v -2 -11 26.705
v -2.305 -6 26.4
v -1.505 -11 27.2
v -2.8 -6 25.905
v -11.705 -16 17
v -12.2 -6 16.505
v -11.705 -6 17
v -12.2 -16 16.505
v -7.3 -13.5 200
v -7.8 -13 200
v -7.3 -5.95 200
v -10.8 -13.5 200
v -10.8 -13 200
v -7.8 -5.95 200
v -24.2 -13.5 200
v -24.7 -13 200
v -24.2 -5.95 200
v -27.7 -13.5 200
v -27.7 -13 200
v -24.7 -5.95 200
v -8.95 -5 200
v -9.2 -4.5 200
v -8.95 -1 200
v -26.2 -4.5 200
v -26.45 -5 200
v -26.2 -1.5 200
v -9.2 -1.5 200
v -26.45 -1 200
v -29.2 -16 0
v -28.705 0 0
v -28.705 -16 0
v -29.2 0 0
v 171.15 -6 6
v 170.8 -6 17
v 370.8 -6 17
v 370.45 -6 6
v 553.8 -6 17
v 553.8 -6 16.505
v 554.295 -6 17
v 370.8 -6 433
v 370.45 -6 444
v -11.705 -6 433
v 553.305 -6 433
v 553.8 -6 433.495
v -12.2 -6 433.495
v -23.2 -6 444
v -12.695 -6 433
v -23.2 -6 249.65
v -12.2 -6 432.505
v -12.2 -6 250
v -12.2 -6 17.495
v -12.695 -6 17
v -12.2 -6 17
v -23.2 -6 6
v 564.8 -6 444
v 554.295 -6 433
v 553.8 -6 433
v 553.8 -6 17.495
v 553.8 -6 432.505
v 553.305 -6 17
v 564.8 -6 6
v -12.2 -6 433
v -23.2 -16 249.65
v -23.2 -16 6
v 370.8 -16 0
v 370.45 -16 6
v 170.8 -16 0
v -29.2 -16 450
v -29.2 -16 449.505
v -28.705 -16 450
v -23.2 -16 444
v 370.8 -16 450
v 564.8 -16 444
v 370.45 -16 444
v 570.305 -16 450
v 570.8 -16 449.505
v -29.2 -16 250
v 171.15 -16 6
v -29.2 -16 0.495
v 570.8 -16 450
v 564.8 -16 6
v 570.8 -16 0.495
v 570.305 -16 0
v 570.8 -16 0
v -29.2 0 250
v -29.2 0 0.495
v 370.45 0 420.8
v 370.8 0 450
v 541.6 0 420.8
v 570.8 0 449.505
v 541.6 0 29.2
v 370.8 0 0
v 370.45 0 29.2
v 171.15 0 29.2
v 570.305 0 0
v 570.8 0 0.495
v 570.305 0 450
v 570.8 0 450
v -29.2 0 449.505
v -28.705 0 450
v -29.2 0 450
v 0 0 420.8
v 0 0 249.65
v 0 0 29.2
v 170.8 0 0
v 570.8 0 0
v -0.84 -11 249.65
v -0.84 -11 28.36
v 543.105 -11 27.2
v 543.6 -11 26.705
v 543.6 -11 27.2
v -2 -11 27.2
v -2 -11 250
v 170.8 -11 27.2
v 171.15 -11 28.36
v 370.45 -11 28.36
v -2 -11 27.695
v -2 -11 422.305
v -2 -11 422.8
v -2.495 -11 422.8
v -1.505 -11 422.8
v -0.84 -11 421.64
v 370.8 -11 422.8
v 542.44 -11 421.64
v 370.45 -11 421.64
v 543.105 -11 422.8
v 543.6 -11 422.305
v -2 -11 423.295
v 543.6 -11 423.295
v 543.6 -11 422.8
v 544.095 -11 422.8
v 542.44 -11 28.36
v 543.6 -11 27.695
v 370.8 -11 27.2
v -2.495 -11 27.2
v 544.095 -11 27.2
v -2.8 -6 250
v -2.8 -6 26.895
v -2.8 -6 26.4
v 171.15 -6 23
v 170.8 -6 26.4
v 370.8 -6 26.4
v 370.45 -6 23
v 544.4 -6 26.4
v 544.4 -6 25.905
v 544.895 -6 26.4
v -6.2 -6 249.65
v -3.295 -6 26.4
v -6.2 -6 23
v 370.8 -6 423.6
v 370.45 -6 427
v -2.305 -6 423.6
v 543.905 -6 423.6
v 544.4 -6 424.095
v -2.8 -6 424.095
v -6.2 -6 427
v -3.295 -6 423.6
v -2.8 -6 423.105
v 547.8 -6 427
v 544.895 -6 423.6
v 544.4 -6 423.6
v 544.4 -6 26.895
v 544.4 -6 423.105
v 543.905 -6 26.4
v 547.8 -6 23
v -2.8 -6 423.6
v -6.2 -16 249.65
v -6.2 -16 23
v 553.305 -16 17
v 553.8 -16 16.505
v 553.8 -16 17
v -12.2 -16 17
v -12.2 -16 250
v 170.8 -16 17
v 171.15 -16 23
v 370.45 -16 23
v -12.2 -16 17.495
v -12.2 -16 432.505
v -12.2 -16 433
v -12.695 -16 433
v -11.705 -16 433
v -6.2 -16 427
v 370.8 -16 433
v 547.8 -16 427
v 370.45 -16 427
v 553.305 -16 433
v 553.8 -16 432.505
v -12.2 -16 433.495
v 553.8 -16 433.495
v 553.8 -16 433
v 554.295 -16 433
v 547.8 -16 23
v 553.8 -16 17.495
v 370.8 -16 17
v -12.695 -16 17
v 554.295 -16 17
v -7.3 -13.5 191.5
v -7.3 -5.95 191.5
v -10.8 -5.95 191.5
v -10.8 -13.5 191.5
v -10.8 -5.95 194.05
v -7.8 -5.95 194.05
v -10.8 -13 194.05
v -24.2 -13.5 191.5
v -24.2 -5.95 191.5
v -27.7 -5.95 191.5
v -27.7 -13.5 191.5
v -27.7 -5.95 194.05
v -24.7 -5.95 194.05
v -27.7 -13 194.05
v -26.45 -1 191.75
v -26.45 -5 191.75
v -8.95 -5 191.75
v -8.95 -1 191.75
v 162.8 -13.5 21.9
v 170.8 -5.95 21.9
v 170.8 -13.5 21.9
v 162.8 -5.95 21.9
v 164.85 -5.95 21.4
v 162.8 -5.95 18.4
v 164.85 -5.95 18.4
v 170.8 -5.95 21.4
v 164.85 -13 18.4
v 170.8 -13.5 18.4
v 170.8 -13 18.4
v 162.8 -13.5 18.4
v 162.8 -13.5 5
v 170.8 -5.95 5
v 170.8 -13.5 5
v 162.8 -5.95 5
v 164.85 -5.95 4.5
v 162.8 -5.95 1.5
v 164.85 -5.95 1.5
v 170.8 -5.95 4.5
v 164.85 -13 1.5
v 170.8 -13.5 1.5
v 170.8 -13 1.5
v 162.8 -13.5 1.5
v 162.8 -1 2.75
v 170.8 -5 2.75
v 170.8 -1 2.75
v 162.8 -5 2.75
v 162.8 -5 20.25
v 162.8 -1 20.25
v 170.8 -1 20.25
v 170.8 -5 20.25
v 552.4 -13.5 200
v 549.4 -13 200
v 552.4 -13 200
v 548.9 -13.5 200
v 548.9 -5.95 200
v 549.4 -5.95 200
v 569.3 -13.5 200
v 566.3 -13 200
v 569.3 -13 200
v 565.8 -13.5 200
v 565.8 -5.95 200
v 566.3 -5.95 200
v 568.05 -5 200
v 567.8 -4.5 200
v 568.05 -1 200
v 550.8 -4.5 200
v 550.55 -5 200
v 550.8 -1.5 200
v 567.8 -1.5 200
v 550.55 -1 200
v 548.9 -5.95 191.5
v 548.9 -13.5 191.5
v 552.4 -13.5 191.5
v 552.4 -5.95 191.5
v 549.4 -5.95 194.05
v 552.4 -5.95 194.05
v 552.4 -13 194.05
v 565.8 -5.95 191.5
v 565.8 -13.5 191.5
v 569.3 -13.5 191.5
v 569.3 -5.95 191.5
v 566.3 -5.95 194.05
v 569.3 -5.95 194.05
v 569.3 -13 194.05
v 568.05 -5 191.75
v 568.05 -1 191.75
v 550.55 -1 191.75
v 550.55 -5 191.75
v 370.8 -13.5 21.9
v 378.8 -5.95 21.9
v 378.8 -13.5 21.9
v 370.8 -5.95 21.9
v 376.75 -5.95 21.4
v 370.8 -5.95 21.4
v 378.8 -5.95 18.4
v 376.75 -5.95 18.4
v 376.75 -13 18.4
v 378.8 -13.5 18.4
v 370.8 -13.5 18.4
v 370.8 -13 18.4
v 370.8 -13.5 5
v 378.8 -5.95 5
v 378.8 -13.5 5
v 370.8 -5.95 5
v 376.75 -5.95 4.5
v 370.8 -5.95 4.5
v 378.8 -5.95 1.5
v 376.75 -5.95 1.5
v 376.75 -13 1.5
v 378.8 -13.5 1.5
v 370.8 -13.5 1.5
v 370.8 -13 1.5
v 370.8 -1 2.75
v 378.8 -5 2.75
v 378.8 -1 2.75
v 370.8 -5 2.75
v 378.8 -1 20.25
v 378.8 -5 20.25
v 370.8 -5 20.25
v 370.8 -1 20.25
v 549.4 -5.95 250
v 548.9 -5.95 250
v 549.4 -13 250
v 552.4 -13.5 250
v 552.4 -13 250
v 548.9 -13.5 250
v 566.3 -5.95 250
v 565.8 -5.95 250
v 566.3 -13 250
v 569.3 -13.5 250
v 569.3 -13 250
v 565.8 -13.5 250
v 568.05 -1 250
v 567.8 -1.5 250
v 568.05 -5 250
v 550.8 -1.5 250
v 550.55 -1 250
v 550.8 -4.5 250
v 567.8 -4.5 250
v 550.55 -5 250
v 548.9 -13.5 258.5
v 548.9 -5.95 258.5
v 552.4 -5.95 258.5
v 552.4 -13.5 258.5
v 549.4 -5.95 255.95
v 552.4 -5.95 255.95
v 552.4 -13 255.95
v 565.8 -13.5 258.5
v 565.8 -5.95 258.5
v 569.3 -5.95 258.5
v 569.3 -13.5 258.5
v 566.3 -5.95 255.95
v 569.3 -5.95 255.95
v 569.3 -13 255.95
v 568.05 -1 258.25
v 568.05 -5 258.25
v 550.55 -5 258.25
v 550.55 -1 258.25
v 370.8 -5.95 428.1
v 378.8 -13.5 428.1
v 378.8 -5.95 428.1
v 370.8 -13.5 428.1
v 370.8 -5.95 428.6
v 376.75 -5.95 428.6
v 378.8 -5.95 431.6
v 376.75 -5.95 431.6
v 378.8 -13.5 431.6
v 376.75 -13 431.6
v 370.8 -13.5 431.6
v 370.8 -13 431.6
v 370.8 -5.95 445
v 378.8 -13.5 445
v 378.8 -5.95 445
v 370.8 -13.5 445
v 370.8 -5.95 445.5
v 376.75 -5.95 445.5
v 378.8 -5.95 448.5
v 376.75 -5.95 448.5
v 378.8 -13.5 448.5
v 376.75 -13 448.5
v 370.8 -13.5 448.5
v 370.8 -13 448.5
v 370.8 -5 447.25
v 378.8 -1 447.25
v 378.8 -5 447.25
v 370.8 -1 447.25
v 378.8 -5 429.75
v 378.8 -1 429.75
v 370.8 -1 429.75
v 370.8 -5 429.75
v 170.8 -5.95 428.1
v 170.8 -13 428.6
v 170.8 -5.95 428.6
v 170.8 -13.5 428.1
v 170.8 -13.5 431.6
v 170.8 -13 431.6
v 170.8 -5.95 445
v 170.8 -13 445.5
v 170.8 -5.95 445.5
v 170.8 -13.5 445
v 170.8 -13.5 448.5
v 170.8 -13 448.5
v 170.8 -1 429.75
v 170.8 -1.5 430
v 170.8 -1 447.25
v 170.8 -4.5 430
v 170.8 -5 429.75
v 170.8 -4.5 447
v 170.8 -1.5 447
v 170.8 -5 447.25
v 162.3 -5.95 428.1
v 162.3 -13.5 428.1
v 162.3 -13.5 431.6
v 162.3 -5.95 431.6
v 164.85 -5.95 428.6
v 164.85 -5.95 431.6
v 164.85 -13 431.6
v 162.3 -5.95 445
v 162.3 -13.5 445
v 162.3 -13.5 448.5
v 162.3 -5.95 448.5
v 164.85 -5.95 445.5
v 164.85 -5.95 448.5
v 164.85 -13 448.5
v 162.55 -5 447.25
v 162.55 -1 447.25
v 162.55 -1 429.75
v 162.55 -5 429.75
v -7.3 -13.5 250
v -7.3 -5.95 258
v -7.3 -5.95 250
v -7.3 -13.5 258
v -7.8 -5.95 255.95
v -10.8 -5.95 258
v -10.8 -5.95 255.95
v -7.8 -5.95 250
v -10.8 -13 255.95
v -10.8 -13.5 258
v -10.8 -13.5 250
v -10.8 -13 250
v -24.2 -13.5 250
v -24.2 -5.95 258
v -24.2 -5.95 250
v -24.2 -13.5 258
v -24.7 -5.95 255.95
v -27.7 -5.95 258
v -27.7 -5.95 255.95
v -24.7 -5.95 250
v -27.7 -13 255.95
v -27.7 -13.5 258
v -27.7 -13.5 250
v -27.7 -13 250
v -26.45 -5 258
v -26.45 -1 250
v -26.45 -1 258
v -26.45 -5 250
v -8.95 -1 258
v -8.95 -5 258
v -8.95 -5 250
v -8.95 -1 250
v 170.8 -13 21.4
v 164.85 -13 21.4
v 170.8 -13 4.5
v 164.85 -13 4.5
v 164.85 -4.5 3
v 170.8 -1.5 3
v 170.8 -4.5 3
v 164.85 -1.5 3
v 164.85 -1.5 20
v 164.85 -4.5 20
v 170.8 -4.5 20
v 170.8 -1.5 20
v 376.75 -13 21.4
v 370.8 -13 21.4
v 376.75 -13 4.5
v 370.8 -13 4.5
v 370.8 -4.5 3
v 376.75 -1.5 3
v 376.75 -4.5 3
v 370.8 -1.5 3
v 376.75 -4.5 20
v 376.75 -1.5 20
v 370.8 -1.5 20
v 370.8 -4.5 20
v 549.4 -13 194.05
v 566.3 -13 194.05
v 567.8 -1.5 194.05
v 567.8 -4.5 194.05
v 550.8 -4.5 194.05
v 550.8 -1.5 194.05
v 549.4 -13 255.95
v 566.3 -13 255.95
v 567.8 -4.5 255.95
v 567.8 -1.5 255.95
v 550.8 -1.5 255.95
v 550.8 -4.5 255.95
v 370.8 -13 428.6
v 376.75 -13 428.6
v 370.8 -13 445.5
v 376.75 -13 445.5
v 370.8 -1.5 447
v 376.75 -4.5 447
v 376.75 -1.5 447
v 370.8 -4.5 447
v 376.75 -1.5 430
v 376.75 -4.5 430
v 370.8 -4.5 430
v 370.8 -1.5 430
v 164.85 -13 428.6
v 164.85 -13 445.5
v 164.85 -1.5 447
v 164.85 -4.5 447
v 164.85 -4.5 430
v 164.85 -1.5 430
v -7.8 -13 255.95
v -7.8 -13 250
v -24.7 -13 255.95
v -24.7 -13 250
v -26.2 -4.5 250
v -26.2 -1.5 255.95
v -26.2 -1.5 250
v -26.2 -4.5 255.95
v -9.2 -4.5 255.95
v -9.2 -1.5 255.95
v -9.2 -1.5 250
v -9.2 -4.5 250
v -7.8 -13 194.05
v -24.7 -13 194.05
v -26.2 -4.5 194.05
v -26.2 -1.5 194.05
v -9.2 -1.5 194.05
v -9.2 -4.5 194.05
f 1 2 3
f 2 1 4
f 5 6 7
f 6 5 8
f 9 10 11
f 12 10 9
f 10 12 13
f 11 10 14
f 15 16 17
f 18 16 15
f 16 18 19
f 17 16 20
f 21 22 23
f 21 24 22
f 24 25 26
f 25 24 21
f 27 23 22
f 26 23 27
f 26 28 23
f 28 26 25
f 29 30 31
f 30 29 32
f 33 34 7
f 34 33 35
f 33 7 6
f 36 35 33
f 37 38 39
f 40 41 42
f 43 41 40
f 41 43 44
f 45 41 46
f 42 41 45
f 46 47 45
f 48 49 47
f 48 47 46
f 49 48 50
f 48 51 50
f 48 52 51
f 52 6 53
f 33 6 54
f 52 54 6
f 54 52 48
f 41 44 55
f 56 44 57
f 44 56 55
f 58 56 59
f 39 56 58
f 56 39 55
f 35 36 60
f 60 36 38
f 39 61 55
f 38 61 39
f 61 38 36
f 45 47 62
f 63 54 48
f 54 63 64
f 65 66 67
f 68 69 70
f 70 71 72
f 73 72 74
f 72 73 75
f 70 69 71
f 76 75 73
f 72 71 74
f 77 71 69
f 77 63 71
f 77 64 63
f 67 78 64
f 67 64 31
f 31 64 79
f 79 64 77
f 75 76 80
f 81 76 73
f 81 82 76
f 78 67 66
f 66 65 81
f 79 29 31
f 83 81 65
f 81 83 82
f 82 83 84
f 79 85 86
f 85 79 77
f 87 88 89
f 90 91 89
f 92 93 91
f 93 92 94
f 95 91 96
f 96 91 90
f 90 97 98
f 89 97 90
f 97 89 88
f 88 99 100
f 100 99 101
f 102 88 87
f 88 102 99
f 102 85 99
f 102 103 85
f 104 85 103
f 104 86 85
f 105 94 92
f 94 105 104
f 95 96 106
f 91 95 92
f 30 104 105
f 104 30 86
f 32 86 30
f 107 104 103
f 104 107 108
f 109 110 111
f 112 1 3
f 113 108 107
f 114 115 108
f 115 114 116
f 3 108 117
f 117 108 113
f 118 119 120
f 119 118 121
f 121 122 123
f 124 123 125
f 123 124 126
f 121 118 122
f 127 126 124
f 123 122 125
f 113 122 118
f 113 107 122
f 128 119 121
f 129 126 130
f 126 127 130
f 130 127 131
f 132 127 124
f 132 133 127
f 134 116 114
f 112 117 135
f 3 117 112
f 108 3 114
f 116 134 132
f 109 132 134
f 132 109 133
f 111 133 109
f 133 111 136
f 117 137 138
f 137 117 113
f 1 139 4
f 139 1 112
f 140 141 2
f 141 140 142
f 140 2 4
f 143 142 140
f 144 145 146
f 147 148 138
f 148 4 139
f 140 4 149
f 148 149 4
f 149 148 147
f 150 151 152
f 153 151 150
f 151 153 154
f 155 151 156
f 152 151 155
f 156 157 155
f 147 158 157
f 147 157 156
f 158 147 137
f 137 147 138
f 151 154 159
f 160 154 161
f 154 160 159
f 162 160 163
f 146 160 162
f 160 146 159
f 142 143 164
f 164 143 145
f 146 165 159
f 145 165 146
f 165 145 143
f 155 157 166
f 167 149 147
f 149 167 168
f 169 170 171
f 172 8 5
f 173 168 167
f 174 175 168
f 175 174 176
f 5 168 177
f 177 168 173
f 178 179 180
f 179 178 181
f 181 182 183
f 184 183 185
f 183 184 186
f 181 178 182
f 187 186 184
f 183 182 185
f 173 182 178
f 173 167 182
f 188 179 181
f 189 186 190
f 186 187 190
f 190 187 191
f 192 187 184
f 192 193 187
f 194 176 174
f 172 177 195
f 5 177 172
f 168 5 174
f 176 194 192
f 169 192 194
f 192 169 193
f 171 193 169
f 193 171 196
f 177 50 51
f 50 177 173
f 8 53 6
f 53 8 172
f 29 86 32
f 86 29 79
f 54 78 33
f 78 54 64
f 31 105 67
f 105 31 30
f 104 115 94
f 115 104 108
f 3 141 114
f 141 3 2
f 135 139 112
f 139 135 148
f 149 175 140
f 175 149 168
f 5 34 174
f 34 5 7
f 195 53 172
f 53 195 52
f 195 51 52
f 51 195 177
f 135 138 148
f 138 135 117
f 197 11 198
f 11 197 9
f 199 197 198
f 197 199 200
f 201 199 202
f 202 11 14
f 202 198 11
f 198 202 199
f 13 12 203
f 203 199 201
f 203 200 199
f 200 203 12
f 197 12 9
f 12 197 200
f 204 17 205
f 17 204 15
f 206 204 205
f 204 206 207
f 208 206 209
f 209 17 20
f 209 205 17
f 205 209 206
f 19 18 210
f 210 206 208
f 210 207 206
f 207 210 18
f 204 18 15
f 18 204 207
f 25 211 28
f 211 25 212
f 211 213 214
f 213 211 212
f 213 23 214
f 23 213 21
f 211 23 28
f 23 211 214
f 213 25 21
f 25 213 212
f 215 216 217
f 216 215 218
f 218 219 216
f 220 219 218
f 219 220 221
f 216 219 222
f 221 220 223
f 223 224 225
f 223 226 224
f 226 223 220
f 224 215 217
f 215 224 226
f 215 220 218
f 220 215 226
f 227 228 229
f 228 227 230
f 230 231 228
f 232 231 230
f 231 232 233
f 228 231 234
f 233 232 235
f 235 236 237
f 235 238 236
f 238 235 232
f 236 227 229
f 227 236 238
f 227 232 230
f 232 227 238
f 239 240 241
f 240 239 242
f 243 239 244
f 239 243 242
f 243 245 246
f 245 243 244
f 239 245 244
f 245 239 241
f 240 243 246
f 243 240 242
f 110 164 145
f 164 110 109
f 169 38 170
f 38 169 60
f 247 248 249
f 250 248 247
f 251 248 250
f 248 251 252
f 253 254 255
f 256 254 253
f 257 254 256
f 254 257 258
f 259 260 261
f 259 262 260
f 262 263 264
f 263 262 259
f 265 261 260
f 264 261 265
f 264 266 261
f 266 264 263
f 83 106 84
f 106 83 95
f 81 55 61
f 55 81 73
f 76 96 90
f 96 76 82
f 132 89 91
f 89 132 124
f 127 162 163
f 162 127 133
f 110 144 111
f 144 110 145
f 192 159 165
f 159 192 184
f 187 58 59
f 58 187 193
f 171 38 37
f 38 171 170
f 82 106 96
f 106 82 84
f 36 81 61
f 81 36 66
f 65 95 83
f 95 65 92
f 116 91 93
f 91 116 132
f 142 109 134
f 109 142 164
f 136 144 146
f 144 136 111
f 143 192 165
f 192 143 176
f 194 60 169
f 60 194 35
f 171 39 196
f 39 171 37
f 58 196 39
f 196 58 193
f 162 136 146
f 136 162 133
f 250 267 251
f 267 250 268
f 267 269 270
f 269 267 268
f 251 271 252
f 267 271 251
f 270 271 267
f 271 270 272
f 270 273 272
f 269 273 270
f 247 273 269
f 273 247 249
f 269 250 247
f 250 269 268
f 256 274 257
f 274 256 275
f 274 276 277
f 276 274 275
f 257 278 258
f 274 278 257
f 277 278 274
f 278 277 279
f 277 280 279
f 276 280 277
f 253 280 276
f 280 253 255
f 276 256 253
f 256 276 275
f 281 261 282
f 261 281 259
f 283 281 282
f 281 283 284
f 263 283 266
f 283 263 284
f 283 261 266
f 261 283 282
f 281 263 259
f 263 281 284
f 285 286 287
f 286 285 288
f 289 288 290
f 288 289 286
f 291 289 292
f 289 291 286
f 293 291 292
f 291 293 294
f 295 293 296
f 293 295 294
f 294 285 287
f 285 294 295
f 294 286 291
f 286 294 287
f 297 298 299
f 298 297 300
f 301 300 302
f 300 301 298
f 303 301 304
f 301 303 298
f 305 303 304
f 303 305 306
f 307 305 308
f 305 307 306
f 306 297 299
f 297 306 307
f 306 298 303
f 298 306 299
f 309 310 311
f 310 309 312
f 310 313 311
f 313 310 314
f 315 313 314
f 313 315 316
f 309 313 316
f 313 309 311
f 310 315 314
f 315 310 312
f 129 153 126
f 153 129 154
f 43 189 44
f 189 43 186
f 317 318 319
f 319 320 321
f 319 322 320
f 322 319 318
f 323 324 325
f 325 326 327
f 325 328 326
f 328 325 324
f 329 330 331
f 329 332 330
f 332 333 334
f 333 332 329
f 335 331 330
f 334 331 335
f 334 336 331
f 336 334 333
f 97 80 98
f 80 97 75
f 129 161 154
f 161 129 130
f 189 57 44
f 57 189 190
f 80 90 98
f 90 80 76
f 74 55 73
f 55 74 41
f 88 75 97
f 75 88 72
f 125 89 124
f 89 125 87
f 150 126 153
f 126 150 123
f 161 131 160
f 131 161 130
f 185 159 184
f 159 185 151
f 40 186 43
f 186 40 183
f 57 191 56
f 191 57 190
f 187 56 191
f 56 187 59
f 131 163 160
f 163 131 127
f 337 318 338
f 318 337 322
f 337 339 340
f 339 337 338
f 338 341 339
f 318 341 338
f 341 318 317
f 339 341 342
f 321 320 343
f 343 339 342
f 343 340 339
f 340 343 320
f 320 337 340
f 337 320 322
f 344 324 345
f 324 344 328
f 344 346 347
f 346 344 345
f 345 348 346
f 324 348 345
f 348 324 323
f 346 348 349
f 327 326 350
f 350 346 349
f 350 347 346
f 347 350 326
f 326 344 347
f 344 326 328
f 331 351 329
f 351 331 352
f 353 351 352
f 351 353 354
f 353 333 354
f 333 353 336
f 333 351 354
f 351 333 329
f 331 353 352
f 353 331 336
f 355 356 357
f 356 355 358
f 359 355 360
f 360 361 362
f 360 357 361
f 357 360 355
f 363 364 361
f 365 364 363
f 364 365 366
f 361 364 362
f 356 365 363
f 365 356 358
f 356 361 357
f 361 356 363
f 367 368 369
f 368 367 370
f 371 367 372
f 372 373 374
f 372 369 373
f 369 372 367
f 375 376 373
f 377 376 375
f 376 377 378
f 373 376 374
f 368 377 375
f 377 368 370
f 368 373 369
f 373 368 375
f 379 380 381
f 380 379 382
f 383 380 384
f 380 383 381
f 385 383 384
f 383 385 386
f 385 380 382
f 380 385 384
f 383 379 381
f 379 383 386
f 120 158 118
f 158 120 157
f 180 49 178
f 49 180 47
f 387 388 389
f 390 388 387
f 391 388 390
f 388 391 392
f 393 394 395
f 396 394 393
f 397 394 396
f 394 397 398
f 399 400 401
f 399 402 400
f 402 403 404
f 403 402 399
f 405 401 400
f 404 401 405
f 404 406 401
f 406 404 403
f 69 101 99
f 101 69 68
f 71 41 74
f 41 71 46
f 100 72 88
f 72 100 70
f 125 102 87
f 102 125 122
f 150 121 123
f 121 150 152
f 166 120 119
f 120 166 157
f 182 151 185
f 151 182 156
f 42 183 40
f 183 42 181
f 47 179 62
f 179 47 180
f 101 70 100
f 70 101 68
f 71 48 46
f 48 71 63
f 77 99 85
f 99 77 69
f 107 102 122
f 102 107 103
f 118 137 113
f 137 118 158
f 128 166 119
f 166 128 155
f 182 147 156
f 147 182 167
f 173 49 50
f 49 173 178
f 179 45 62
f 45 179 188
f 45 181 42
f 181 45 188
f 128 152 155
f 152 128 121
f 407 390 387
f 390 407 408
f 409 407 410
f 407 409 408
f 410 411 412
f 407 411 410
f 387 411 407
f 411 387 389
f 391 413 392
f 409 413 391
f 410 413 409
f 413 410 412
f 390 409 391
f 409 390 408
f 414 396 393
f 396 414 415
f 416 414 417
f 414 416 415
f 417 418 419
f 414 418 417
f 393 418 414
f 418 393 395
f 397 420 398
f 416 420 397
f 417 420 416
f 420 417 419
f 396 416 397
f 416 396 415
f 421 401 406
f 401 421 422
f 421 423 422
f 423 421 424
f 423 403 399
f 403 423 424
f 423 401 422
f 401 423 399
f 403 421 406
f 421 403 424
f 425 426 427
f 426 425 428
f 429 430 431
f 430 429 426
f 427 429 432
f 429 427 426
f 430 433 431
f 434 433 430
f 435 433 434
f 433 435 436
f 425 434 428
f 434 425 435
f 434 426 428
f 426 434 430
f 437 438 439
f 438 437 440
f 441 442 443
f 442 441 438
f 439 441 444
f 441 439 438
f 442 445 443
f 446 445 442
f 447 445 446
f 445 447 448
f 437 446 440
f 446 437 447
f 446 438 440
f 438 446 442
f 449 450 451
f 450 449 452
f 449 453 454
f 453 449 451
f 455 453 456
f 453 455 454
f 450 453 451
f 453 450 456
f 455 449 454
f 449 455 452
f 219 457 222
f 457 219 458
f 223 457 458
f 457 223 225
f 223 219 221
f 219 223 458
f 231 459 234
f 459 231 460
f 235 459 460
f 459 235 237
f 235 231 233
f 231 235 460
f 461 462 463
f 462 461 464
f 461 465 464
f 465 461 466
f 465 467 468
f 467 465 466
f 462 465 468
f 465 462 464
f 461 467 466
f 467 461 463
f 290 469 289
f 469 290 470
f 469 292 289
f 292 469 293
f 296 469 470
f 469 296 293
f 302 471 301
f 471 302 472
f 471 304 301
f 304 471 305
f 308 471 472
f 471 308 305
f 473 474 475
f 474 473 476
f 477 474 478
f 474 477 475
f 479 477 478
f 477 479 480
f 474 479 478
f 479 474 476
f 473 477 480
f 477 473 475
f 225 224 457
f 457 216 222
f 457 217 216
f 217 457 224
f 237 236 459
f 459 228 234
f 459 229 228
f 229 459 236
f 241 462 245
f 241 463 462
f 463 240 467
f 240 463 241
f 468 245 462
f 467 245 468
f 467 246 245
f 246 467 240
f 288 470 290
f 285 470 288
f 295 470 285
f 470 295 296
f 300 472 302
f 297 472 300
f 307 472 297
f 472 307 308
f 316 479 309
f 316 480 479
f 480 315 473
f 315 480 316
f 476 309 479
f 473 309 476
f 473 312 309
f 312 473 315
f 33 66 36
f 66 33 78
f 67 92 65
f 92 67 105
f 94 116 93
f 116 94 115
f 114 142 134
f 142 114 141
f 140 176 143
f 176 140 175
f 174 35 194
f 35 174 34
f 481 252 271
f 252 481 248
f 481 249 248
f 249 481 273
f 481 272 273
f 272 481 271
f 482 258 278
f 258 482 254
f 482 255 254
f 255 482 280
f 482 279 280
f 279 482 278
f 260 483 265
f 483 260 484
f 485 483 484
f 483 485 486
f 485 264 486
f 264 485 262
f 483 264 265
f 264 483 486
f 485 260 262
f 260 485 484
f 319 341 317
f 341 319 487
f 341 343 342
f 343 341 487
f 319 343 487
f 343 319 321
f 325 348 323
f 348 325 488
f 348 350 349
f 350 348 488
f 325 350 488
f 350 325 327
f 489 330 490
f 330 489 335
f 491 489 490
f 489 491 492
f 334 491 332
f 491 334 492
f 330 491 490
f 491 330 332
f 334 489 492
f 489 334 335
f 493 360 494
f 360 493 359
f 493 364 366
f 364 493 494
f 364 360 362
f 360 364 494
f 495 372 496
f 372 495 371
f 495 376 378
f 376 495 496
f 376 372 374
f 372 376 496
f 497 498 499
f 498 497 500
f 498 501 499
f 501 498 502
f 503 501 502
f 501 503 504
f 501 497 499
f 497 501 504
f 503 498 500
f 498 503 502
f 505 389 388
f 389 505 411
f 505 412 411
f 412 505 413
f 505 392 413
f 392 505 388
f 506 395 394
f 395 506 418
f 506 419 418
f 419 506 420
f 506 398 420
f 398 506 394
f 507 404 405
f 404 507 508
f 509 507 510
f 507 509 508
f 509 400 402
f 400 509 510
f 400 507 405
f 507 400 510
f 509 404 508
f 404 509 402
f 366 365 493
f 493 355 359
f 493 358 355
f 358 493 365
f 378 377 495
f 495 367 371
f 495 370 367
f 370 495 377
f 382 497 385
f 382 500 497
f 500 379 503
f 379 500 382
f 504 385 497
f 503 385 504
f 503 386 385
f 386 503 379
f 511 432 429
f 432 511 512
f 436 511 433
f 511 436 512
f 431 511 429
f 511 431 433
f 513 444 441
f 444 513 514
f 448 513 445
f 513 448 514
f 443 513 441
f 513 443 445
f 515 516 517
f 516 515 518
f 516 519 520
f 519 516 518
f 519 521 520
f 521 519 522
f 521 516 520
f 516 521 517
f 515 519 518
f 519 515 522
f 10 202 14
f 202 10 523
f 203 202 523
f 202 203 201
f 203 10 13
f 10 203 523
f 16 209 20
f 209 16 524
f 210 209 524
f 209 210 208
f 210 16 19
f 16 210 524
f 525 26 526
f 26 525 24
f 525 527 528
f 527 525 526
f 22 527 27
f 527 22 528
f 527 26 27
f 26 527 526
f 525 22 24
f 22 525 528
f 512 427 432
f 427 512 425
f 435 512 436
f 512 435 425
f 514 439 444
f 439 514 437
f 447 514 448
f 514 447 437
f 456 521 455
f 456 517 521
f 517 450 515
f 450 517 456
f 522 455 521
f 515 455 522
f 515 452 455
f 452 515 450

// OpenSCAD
// Rectangular aquarium lid — rim frame from max glass-channel span + modular pieces.
// Uses rim_piece_assembly / rim_corner_assembly (max 200 mm per straight).
// glass_width / glass_depth are the pane (channel) span; placement offsets by
// profile width. Ingress feature values are clear openings; bay adds ~60 mm.
// Corner arms default from glass size (≤400 mm side → side/2, else 200 mm);
// straight runs maximize 200 mm pieces with one remainder segment.
//
// QUICK START
//   include <rim_rectangular_lid.scad>
//   rim_rectangular_lid();                    // assembled preview
//   rim_rectangular_lid(layout = "blowout");  // spread for inspection
//   rim_rectangular_lid(layout = "plate");    // 250×250 mm print bed pack
//
// FEATURE VECTORS (per corner or per side segment)
//   [0] cord_hole          bool
//   [1] cord_hole_inner_d  mm
//   [2] cord_hole_pos      "left"|"middle"|"right"
//   [3] cord_under         bool
//   [4] cord_under_gap_len mm
//   [5] lid_ingress        bool  (opening length > 0)
//   [6] ingress opening    mm (0 = off); bay length = opening + pad (~60 / 2×profile)
//   [7] ingress_depth      mm
//   [8] ingress_on         "a"|"b"  (corners only)
//   [9] cord_hole_on       "a"|"b"  (corners only)
//   [10] cord_under_on     "a"|"b"  (corners only)
//
//   RIM_FEAT_NONE = default row; override corner_features[0..3] (SW,SE,NE,NW)
//   and side_features[side][seg] for middle straight pieces on each side.

include <rim_piece_assembly.scad>

// Feature vector: see header comment block below.
RIM_FEAT_NONE = [
    false, 6, "middle",
    false, 20,
    false, 0, edge_ingress_depth, "a", "a", "a"
];

/* [Glass / frame] */
// Max glass-channel span (the pane). Placement offsets by profile width.
glass_width       = 600;   // max channel width along +X (mm)
glass_depth       = 450;   // max channel depth along +Z (mm)
// glass_thickness is defined in rim_piece_assembly.scad (Customizer there or -D)

/* [Build limits] */
rim_max_piece_len = 200;   // max straight length (mm)
rim_corner_leg    = 0;     // 0 = auto from glass size (see rim_rect_effective_corner_leg)
rim_corner_split  = 400;   // side ≤ this → corner = side/2; else corner = rim_max_piece_len
// 0 = auto 2×profile (~60 mm). Added to user ingress opening → visible U bay.
rim_ingress_opening_offset = 0;

/* [Layout] */
rim_layout        = "assembled"; // "assembled" | "blowout" | "plate"
rim_plate_x       = 250;    // printable bed X (mm)
rim_plate_y       = 250;    // printable bed Y (mm)
rim_layout_gap    = 12;     // spacing between parts (mm)
rim_blowout_gap   = 0;      // 0 = auto (layout_gap×2 + profile width)
rim_plate_margin  = 8;      // bed edge margin (mm)

/* [Corner features — SW, SE, NE, NW] */
corner_features = [
    RIM_FEAT_NONE,
    RIM_FEAT_NONE,
    RIM_FEAT_NONE,
    RIM_FEAT_NONE
];

/* [Side middle-segment features — [S, E, N, W] each a list per segment] */
side_features_s = [];
side_features_e = [];
side_features_n = [];
side_features_w = [];

// ---------------------------------------------------------------------------
// Feature helpers
// ---------------------------------------------------------------------------

// User ingress opening → visible U bay (opening + ~60 mm = 2×profile).
function rim_ingress_opening_pad() =
    rim_ingress_opening_offset > 0 ? rim_ingress_opening_offset : 2 * edge_profile_max_x;

function rim_ingress_bay_from_opening(opening) =
    opening > 0 ? opening + rim_ingress_opening_pad() : 0;

function rim_feat_cord(f)        = f[0];
function rim_feat_cord_d(f)      = f[1];
function rim_feat_cord_pos(f)    = f[2];
function rim_feat_under(f)       = f[3];
function rim_feat_under_gap(f)   = f[4];
function rim_feat_ingress(f)     = f[5] && f[6] > 0;
function rim_feat_ingress_opening(f) = f[6];
function rim_feat_ingress_len(f) = rim_ingress_bay_from_opening(f[6]);
function rim_feat_ingress_dep(f) = f[7];
function rim_feat_ingress_on(f)  = f[8];
function rim_feat_cord_on(f)     = f[9];
function rim_feat_under_on(f)    = f[10];

function rim_side_feat_list(side_idx, lists) =
    side_idx == 0 ? lists[0] :
    side_idx == 1 ? lists[1] :
    side_idx == 2 ? lists[2] : lists[3];

function rim_side_feat(side_idx, seg_idx, lists) =
    let (
        row = rim_side_feat_list(side_idx, lists),
        n   = len(row)
    )
    (seg_idx < n) ? row[seg_idx] : RIM_FEAT_NONE;

function rim_corner_feat(corner_idx, corners = corner_features) =
    corners[corner_idx];

// ---------------------------------------------------------------------------
// Length / join planning
// ---------------------------------------------------------------------------

// Corner arm length from one glass side: ≤split → side/2, else max print length.
function rim_corner_leg_for_dim(dim, max_len = rim_max_piece_len, split = rim_corner_split) =
    dim <= split ? dim / 2 : max_len;

// Uniform corner arms (length_a = length_b): limited by both glass width and depth.
function rim_rect_auto_corner_leg(gw, gd, max_len = rim_max_piece_len, split = rim_corner_split) =
    let (
        leg_w = rim_corner_leg_for_dim(gw, max_len, split),
        leg_d = rim_corner_leg_for_dim(gd, max_len, split)
    )
    max(edge_profile_max_x + 1, min(leg_w, leg_d));

function rim_corner_feat_min_leg(f, base_leg) =
    rim_feat_ingress(f)
        ? max(base_leg, rim_feat_ingress_len(f) + 4)
        : base_leg;

function rim_rect_effective_corner_leg(
    gw = glass_width, gd = glass_depth,
    corners = corner_features, corner_leg = rim_corner_leg,
    max_len = rim_max_piece_len, split = rim_corner_split
) =
    let (
        auto_leg = rim_rect_auto_corner_leg(gw, gd, max_len, split),
        base = corner_leg > edge_profile_max_x ? corner_leg : auto_leg,
        mins = [ for (c = corners) rim_corner_feat_min_leg(c, base) ],
        feat_need = len(mins) > 0 ? max(mins) : base
    )
    max(base, feat_need);

// Straight run between corner legs along one glass side.
function rim_side_straight_total(glass_dim, leg) =
    max(0, glass_dim - 2 * leg);

// Maximize full-length pieces; one remainder segment if needed.
function rim_rect_straight_segments(run_len, max_len = rim_max_piece_len) =
    run_len <= 0 ? [] :
    let (
        n_full = floor(run_len / max_len),
        partial = run_len - n_full * max_len
    )
    n_full == 0 ? [run_len] :
    partial > 0
        ? concat([ for (i = [0 : n_full - 1]) max_len ], [partial])
        : [ for (i = [0 : n_full - 1]) max_len ];

// edge_join_ends for a straight chained between female corner pockets.
function rim_rect_straight_joins(seg_idx, seg_count) =
    seg_count == 1 ? 2 :          // both male → two corners
    seg_idx == 0 ? 1 :            // male into corner, female to next
    seg_idx == seg_count - 1 ? 2 : // male from prev, male into corner
    1;                            // middle link

function rim_rect_side_dims(gw = glass_width, gd = glass_depth, corners = corner_features) =
    let (leg = rim_rect_effective_corner_leg(gw, gd, corners))
    [
        rim_side_straight_total(gw, leg),
        rim_side_straight_total(gd, leg),
        rim_side_straight_total(gw, leg),
        rim_side_straight_total(gd, leg)
    ];

function rim_rect_side_seg_lens(side_idx, gw = glass_width, gd = glass_depth,
    max_len = rim_max_piece_len, corners = corner_features
) =
    let (
        leg  = rim_rect_effective_corner_leg(gw, gd, corners),
        dim  = (side_idx == 0 || side_idx == 2) ? gw : gd,
        run  = rim_side_straight_total(dim, leg)
    )
    rim_rect_straight_segments(run, max_len);

// ---------------------------------------------------------------------------
// Placement — native rim coords: path in XZ, profile in XY, Y = up
// Corners: SW=0, SE=1, NE=2, NW=3. Clockwise frame: S +X, E +Z, N -X, W -Z.
// Native rim_corner: A along +Z, B along -X after the miter.
// ---------------------------------------------------------------------------

// Clockwise joint pattern: female pockets on both free arms (join 2) receive
// male straight ends; straights chain male→female between segments.
function rim_rect_corner_joins(ci) = [2, 2];

module rim_rect_corner_pose(ci) {
    // Base −180° Y so corner profile matches straight pieces; per-corner yaw.
    rotate([0, -180, 0]) {
        if (ci == 0)
            children();                                    // SW: +X south, +Z west
        else if (ci == 1)
            mirror([1, 0, 0]) children();                // SE: −X south, +Z east
        else if (ci == 2)
            rotate([0, 180, 0]) children();              // NE: −X north, −Z east
        else
            rotate([0, 90, 0]) children();               // NW: +X north, −Z west
    }
}

function rim_rect_corner_pos(ci, gw = glass_width, gd = glass_depth) =
    ci == 0 ? [0, 0, 0] :
    ci == 1 ? [gw - 2 * edge_profile_max_x, 0, 0] :
    ci == 2 ? [gw - 2 * edge_profile_max_x, 0, gd] :
              [-edge_profile_max_x, 0, gd - edge_profile_max_x];

// Pose anchor: shift from glass-corner pos so arms meet straights (−180° Y base).
function rim_rect_corner_anchor(ci, leg) =
    ci == 0 ? [0, 0, leg] :
    ci == 1 ? [0, 0, leg] :
    ci == 2 ? [0, 0, -leg] :
              [leg, 0, 0];

// Blowout: push pieces outward in XZ while keeping row/column alignment.
function rim_rect_blowout_gap_size(gap = rim_layout_gap * 2) =
    rim_blowout_gap > 0 ? rim_blowout_gap : gap + edge_profile_max_x;

// Extra run offset per segment: gap after corner, then between each chained piece.
function rim_rect_blowout_along_extra(seg_idx, gap) = (seg_idx + 1) * gap;

// Far-axis explode: gap × (segment count + 1). si 0 = X-run (S/N), si 1 = Z-run (E/W).
function rim_rect_blowout_side_gap(si, gap, gw, gd, corners = corner_features) =
    gap * (len(rim_rect_side_seg_lens(si, gw, gd, rim_max_piece_len, corners)) + 1);

// [gx, gz] — far +X and far −Z from the fixed NW corner.
function rim_rect_blowout_axis_gaps(gap, gw, gd, corners = corner_features) =
    [
        rim_rect_blowout_side_gap(0, gap, gw, gd, corners),
        rim_rect_blowout_side_gap(1, gap, gw, gd, corners)
    ];

// NW stays at (−gap, +gap). Other corners: gx along X (south segs), gz along Z (east segs).
// Each side copies its clockwise-start corner (S←SW, E←SE, N←NE, W←NW).
function rim_rect_blowout_corner_offset(ci, gap, gw = glass_width, gd = glass_depth,
    corners = corner_features
) =
    let (ax = rim_rect_blowout_axis_gaps(gap, gw, gd, corners), gx = ax[0], gz = ax[1])
    ci == 0 ? [-gap, 0, -gz] :
    ci == 1 ? [ gx,  0, -gz] :
    ci == 2 ? [ gx,  0,  gap] :
              [-gap, 0,  gap];

function rim_rect_blowout_side_offset(si, gap, gw = glass_width, gd = glass_depth,
    corners = corner_features
) =
    let (ax = rim_rect_blowout_axis_gaps(gap, gw, gd, corners), gx = ax[0], gz = ax[1])
    si == 0 ? [-gap, 0, -gz] :
    si == 1 ? [ gx,  0, -gz] :
    si == 2 ? [ gx,  0,  gap] :
              [-gap, 0,  gap];

module rim_rect_place_corner(ci, leg = undef, feat = undef,
    gw = glass_width, gd = glass_depth, corners = corner_features,
    offset = [0, 0, 0]
) {
    leg_eff = is_undef(leg) ? rim_rect_effective_corner_leg(gw, gd, corners) : leg;
    f = is_undef(feat) ? rim_corner_feat(ci, corners) : feat;
    joins = rim_rect_corner_joins(ci);
    p = rim_rect_corner_pos(ci, gw, gd) + rim_rect_corner_anchor(ci, leg_eff) + offset;
    translate(p)
    rim_rect_corner_pose(ci)
        rim_corner_assembly(
            length_a = leg_eff,
            length_b = leg_eff,
            join_a = joins[0],
            join_b = joins[1],
            cord_hole = rim_feat_cord(f),
            cord_hole_inner_d = rim_feat_cord_d(f),
            cord_hole_pos = rim_feat_cord_pos(f),
            cord_hole_on = rim_feat_cord_on(f),
            cord_under = rim_feat_under(f),
            cord_under_gap_len = rim_feat_under_gap(f),
            cord_under_on = rim_feat_under_on(f),
            lid_ingress = rim_feat_ingress(f),
            ingress_depth = rim_feat_ingress_dep(f),
            ingress_length = rim_feat_ingress_len(f),
            ingress_on = rim_feat_ingress_on(f)
        );
}

function rim_rect_side_yaw(side_idx) =
    side_idx == 0 ? 90 :
    side_idx == 1 ? 0 :
    side_idx == 2 ? -90 : 180;
function rim_rect_seg_offset(segs, seg_idx, acc = 0, i = 0) =
    i >= seg_idx ? acc : rim_rect_seg_offset(segs, seg_idx, acc + segs[i], i + 1);

module rim_rect_place_straight(side_idx, seg_idx, length, feat = undef,
    gw = glass_width, gd = glass_depth, leg = undef,
    side_feat_lists = [side_features_s, side_features_e, side_features_n, side_features_w],
    corners = corner_features,
    offset = [0, 0, 0],
    chain_gap = 0
) {
    leg_eff = is_undef(leg) ? rim_rect_effective_corner_leg(gw, gd, corners) : leg;
    f = is_undef(feat)
        ? rim_side_feat(side_idx, seg_idx, side_feat_lists)
        : feat;
    segs = rim_rect_side_seg_lens(side_idx, gw, gd, rim_max_piece_len, corners);
    joins = rim_rect_straight_joins(seg_idx, len(segs));
    along_extra = chain_gap > 0 ? rim_rect_blowout_along_extra(seg_idx, chain_gap) : 0;
    offset_along = leg_eff + rim_rect_seg_offset(segs, seg_idx) + along_extra;

    translate(
        (side_idx == 0 ? [offset_along - edge_profile_max_x, 0, edge_profile_max_x] :
         side_idx == 1 ? [gw - 2 * edge_profile_max_x, 0, offset_along] :
         side_idx == 2 ? [gw - offset_along - edge_profile_max_x, 0, gd - edge_profile_max_x] :
                         [0, 0, gd - offset_along])
        + offset
    )
    rotate([0, rim_rect_side_yaw(side_idx), 0])
        rim_piece_assembly(
            length = length,
            edge_join_ends = joins,
            cord_hole = rim_feat_cord(f),
            cord_hole_inner_d = rim_feat_cord_d(f),
            cord_hole_pos = rim_feat_cord_pos(f),
            cord_under = rim_feat_under(f),
            cord_under_gap_len = rim_feat_under_gap(f),
            lid_ingress = rim_feat_ingress(f),
            ingress_depth = rim_feat_ingress_dep(f),
            ingress_length = rim_feat_ingress_len(f)
        );
}

module rim_rect_place_side(side_idx, gw = glass_width, gd = glass_depth,
    side_feat_lists = [side_features_s, side_features_e, side_features_n, side_features_w],
    corners = corner_features
) {
    segs = rim_rect_side_seg_lens(side_idx, gw, gd, rim_max_piece_len, corners);
    if (len(segs) > 0)
        for (i = [0 : len(segs) - 1])
            rim_rect_place_straight(side_idx, i, segs[i],
                gw = gw, gd = gd, side_feat_lists = side_feat_lists, corners = corners);
}

// ---------------------------------------------------------------------------
// Print / blowout layout
// ---------------------------------------------------------------------------

// Lay a path-length piece flat on the bed (profile height → +Z).
module rim_rect_print_flat() {
    rotate([90, 0, 0])
        children();
}

function rim_rect_straight_footprint(len) = [len, edge_overall_height + 2];
function rim_rect_corner_footprint(leg) = [2 * leg + edge_profile_max_x, edge_overall_height + 2];

// Build a feature row (see header). ingress_len is the opening; bay adds pad.
function rim_feat(
    cord_hole = false, cord_d = 6, cord_pos = "middle",
    cord_under = false, under_gap = 20,
    ingress = false, ingress_len = 0, ingress_dep = edge_ingress_depth,
    ingress_on = "a", cord_on = "a", under_on = "a"
) = [
    cord_hole, cord_d, cord_pos,
    cord_under, under_gap,
    ingress, ingress_len, ingress_dep,
    ingress_on, cord_on, under_on
];

module rim_rect_draw_plate_outline() {
    color([0.75, 0.75, 0.8, 0.25])
        translate([0, 0, -0.4])
            cube([rim_plate_x, rim_plate_y, 0.2]);
    %translate([rim_plate_margin, rim_plate_margin, 0])
        color([0.5, 0.8, 0.5, 0.15])
            cube([
                rim_plate_x - 2 * rim_plate_margin,
                rim_plate_y - 2 * rim_plate_margin,
                0.1
            ]);
}

module rim_rect_lid_assembled(gw = glass_width, gd = glass_depth,
    corners = corner_features,
    side_feat_lists = [side_features_s, side_features_e, side_features_n, side_features_w]
) {
    leg = rim_rect_effective_corner_leg(gw, gd, corners);
    for (ci = [0 : 3])
        rim_rect_place_corner(ci, leg, rim_corner_feat(ci, corners), gw, gd, corners);
    for (si = [0 : 3])
        rim_rect_place_side(si, gw, gd, side_feat_lists, corners);
}

module rim_rect_plate_item(part, leg, gw, gd, corners, side_feat_lists) {
    if (part[2] == "corner")
        rim_rect_place_corner(part[3], leg, rim_corner_feat(part[3], corners), gw, gd);
    else
        rim_rect_place_straight(part[3], part[4], part[5], side_feat_lists = side_feat_lists);
}

function rim_rect_pack_positions(parts, idx = 0, cx = rim_plate_margin, cy = rim_plate_margin,
    row_h = 0, out = []
) =
    idx >= len(parts) ? out :
    let (
        w = parts[idx][0],
        h = parts[idx][1],
        wrap = cx + w > rim_plate_x - rim_plate_margin,
        nx = wrap ? rim_plate_margin : cx,
        ny = wrap ? (cy + row_h + rim_layout_gap) : cy,
        nrh = wrap ? h : max(row_h, h),
        ncx = nx + w + rim_layout_gap
    )
    rim_rect_pack_positions(parts, idx + 1, ncx, ny, nrh, concat(out, [[nx, ny]]));

module rim_rect_blowout_corner(ci, leg, feat, gap,
    gw = glass_width, gd = glass_depth, corners = corner_features
) {
    rim_rect_place_corner(
        ci, leg, feat, gw, gd, corners,
        offset = rim_rect_blowout_corner_offset(ci, gap, gw, gd, corners)
    );
}

module rim_rect_lid_blowout(gw = glass_width, gd = glass_depth,
    corners = corner_features,
    side_feat_lists = [side_features_s, side_features_e, side_features_n, side_features_w],
    gap = undef
) {
    leg = rim_rect_effective_corner_leg(gw, gd, corners);
    gap_eff = is_undef(gap) ? rim_rect_blowout_gap_size() : gap;

    // XZ plane only: rows share Z, columns share X; gaps separate pieces outward.
    for (ci = [0 : 3])
        rim_rect_blowout_corner(ci, leg, rim_corner_feat(ci, corners), gap_eff, gw, gd, corners);

    for (si = [0 : 3]) {
        segs = rim_rect_side_seg_lens(si, gw, gd, rim_max_piece_len, corners);
        if (len(segs) > 0)
            for (i = [0 : len(segs) - 1])
                rim_rect_place_straight(
                    si, i, segs[i],
                    gw = gw, gd = gd, leg = leg,
                    side_feat_lists = side_feat_lists, corners = corners,
                    offset = rim_rect_blowout_side_offset(si, gap_eff, gw, gd, corners),
                    chain_gap = gap_eff
                );
    }
}

module rim_rect_lid_plate(gw = glass_width, gd = glass_depth,
    corners = corner_features,
    side_feat_lists = [side_features_s, side_features_e, side_features_n, side_features_w]
) {
    leg = rim_rect_effective_corner_leg(gw, gd, corners);
    rim_rect_draw_plate_outline();

    parts = concat(
        [ for (ci = [0 : 3])
            let (fp = rim_rect_corner_footprint(leg))
            [fp[0], fp[1], "corner", ci]
        ],
        [ for (si = [0 : 3])
            let (segs = rim_rect_side_seg_lens(si, gw, gd))
            if (len(segs) > 0)
                for (i = [0 : len(segs) - 1])
                    let (fp = rim_rect_straight_footprint(segs[i]))
                    [fp[0], fp[1], "straight", si, i, segs[i]]
        ]
    );

    positions = rim_rect_pack_positions(parts);

    for (i = [0 : len(parts) - 1])
        translate([positions[i][0], positions[i][1], 0])
        rim_rect_print_flat()
            rim_rect_plate_item(parts[i], leg, gw, gd, corners, side_feat_lists);
}

// ---------------------------------------------------------------------------
// Main entry
// ---------------------------------------------------------------------------

module rim_rectangular_lid(
    glass_w = glass_width,
    glass_d = glass_depth,
    max_piece_len = rim_max_piece_len,
    layout = rim_layout,
    corners = corner_features,
    side_feats_s = side_features_s,
    side_feats_e = side_features_e,
    side_feats_n = side_features_n,
    side_feats_w = side_features_w
) {
    assert(glass_w >= 2 * rim_rect_effective_corner_leg(glass_w, glass_d, corners),
        "glass_width too small for corners");
    assert(glass_d >= 2 * rim_rect_effective_corner_leg(glass_w, glass_d, corners),
        "glass_depth too small for corners");

  // BOM echo
    leg = rim_rect_effective_corner_leg(glass_w, glass_d, corners);
    dims = rim_rect_side_dims(glass_w, glass_d, corners);
    echo(str(
        "Rim lid ", glass_w, "×", glass_d, " mm glass; corner leg=", leg,
        "; straight runs S/E/N/W=[",
        dims[0], ",", dims[1], ",", dims[2], ",", dims[3], "]"
    ));
    for (si = [0 : 3])
        echo(str("  side ", ["S","E","N","W"][si],
            " segments: ", rim_rect_side_seg_lens(si, glass_w, glass_d, max_piece_len)));

    lists = [side_feats_s, side_feats_e, side_feats_n, side_feats_w];

    if (layout == "assembled")
        rim_rect_lid_assembled(glass_w, glass_d, corners, lists);
    else if (layout == "blowout")
        rim_rect_lid_blowout(glass_w, glass_d, corners, lists);
    else if (layout == "plate")
        rim_rect_lid_plate(glass_w, glass_d, corners, lists);
    else
        assert(false, str("layout must be assembled|blowout|plate (got ", layout, ")"));
}

// Library include: set RIM_RECT_LIB_ONLY = true before include to skip auto-render.
if (is_undef(RIM_RECT_LIB_ONLY))
    rim_rectangular_lid();
